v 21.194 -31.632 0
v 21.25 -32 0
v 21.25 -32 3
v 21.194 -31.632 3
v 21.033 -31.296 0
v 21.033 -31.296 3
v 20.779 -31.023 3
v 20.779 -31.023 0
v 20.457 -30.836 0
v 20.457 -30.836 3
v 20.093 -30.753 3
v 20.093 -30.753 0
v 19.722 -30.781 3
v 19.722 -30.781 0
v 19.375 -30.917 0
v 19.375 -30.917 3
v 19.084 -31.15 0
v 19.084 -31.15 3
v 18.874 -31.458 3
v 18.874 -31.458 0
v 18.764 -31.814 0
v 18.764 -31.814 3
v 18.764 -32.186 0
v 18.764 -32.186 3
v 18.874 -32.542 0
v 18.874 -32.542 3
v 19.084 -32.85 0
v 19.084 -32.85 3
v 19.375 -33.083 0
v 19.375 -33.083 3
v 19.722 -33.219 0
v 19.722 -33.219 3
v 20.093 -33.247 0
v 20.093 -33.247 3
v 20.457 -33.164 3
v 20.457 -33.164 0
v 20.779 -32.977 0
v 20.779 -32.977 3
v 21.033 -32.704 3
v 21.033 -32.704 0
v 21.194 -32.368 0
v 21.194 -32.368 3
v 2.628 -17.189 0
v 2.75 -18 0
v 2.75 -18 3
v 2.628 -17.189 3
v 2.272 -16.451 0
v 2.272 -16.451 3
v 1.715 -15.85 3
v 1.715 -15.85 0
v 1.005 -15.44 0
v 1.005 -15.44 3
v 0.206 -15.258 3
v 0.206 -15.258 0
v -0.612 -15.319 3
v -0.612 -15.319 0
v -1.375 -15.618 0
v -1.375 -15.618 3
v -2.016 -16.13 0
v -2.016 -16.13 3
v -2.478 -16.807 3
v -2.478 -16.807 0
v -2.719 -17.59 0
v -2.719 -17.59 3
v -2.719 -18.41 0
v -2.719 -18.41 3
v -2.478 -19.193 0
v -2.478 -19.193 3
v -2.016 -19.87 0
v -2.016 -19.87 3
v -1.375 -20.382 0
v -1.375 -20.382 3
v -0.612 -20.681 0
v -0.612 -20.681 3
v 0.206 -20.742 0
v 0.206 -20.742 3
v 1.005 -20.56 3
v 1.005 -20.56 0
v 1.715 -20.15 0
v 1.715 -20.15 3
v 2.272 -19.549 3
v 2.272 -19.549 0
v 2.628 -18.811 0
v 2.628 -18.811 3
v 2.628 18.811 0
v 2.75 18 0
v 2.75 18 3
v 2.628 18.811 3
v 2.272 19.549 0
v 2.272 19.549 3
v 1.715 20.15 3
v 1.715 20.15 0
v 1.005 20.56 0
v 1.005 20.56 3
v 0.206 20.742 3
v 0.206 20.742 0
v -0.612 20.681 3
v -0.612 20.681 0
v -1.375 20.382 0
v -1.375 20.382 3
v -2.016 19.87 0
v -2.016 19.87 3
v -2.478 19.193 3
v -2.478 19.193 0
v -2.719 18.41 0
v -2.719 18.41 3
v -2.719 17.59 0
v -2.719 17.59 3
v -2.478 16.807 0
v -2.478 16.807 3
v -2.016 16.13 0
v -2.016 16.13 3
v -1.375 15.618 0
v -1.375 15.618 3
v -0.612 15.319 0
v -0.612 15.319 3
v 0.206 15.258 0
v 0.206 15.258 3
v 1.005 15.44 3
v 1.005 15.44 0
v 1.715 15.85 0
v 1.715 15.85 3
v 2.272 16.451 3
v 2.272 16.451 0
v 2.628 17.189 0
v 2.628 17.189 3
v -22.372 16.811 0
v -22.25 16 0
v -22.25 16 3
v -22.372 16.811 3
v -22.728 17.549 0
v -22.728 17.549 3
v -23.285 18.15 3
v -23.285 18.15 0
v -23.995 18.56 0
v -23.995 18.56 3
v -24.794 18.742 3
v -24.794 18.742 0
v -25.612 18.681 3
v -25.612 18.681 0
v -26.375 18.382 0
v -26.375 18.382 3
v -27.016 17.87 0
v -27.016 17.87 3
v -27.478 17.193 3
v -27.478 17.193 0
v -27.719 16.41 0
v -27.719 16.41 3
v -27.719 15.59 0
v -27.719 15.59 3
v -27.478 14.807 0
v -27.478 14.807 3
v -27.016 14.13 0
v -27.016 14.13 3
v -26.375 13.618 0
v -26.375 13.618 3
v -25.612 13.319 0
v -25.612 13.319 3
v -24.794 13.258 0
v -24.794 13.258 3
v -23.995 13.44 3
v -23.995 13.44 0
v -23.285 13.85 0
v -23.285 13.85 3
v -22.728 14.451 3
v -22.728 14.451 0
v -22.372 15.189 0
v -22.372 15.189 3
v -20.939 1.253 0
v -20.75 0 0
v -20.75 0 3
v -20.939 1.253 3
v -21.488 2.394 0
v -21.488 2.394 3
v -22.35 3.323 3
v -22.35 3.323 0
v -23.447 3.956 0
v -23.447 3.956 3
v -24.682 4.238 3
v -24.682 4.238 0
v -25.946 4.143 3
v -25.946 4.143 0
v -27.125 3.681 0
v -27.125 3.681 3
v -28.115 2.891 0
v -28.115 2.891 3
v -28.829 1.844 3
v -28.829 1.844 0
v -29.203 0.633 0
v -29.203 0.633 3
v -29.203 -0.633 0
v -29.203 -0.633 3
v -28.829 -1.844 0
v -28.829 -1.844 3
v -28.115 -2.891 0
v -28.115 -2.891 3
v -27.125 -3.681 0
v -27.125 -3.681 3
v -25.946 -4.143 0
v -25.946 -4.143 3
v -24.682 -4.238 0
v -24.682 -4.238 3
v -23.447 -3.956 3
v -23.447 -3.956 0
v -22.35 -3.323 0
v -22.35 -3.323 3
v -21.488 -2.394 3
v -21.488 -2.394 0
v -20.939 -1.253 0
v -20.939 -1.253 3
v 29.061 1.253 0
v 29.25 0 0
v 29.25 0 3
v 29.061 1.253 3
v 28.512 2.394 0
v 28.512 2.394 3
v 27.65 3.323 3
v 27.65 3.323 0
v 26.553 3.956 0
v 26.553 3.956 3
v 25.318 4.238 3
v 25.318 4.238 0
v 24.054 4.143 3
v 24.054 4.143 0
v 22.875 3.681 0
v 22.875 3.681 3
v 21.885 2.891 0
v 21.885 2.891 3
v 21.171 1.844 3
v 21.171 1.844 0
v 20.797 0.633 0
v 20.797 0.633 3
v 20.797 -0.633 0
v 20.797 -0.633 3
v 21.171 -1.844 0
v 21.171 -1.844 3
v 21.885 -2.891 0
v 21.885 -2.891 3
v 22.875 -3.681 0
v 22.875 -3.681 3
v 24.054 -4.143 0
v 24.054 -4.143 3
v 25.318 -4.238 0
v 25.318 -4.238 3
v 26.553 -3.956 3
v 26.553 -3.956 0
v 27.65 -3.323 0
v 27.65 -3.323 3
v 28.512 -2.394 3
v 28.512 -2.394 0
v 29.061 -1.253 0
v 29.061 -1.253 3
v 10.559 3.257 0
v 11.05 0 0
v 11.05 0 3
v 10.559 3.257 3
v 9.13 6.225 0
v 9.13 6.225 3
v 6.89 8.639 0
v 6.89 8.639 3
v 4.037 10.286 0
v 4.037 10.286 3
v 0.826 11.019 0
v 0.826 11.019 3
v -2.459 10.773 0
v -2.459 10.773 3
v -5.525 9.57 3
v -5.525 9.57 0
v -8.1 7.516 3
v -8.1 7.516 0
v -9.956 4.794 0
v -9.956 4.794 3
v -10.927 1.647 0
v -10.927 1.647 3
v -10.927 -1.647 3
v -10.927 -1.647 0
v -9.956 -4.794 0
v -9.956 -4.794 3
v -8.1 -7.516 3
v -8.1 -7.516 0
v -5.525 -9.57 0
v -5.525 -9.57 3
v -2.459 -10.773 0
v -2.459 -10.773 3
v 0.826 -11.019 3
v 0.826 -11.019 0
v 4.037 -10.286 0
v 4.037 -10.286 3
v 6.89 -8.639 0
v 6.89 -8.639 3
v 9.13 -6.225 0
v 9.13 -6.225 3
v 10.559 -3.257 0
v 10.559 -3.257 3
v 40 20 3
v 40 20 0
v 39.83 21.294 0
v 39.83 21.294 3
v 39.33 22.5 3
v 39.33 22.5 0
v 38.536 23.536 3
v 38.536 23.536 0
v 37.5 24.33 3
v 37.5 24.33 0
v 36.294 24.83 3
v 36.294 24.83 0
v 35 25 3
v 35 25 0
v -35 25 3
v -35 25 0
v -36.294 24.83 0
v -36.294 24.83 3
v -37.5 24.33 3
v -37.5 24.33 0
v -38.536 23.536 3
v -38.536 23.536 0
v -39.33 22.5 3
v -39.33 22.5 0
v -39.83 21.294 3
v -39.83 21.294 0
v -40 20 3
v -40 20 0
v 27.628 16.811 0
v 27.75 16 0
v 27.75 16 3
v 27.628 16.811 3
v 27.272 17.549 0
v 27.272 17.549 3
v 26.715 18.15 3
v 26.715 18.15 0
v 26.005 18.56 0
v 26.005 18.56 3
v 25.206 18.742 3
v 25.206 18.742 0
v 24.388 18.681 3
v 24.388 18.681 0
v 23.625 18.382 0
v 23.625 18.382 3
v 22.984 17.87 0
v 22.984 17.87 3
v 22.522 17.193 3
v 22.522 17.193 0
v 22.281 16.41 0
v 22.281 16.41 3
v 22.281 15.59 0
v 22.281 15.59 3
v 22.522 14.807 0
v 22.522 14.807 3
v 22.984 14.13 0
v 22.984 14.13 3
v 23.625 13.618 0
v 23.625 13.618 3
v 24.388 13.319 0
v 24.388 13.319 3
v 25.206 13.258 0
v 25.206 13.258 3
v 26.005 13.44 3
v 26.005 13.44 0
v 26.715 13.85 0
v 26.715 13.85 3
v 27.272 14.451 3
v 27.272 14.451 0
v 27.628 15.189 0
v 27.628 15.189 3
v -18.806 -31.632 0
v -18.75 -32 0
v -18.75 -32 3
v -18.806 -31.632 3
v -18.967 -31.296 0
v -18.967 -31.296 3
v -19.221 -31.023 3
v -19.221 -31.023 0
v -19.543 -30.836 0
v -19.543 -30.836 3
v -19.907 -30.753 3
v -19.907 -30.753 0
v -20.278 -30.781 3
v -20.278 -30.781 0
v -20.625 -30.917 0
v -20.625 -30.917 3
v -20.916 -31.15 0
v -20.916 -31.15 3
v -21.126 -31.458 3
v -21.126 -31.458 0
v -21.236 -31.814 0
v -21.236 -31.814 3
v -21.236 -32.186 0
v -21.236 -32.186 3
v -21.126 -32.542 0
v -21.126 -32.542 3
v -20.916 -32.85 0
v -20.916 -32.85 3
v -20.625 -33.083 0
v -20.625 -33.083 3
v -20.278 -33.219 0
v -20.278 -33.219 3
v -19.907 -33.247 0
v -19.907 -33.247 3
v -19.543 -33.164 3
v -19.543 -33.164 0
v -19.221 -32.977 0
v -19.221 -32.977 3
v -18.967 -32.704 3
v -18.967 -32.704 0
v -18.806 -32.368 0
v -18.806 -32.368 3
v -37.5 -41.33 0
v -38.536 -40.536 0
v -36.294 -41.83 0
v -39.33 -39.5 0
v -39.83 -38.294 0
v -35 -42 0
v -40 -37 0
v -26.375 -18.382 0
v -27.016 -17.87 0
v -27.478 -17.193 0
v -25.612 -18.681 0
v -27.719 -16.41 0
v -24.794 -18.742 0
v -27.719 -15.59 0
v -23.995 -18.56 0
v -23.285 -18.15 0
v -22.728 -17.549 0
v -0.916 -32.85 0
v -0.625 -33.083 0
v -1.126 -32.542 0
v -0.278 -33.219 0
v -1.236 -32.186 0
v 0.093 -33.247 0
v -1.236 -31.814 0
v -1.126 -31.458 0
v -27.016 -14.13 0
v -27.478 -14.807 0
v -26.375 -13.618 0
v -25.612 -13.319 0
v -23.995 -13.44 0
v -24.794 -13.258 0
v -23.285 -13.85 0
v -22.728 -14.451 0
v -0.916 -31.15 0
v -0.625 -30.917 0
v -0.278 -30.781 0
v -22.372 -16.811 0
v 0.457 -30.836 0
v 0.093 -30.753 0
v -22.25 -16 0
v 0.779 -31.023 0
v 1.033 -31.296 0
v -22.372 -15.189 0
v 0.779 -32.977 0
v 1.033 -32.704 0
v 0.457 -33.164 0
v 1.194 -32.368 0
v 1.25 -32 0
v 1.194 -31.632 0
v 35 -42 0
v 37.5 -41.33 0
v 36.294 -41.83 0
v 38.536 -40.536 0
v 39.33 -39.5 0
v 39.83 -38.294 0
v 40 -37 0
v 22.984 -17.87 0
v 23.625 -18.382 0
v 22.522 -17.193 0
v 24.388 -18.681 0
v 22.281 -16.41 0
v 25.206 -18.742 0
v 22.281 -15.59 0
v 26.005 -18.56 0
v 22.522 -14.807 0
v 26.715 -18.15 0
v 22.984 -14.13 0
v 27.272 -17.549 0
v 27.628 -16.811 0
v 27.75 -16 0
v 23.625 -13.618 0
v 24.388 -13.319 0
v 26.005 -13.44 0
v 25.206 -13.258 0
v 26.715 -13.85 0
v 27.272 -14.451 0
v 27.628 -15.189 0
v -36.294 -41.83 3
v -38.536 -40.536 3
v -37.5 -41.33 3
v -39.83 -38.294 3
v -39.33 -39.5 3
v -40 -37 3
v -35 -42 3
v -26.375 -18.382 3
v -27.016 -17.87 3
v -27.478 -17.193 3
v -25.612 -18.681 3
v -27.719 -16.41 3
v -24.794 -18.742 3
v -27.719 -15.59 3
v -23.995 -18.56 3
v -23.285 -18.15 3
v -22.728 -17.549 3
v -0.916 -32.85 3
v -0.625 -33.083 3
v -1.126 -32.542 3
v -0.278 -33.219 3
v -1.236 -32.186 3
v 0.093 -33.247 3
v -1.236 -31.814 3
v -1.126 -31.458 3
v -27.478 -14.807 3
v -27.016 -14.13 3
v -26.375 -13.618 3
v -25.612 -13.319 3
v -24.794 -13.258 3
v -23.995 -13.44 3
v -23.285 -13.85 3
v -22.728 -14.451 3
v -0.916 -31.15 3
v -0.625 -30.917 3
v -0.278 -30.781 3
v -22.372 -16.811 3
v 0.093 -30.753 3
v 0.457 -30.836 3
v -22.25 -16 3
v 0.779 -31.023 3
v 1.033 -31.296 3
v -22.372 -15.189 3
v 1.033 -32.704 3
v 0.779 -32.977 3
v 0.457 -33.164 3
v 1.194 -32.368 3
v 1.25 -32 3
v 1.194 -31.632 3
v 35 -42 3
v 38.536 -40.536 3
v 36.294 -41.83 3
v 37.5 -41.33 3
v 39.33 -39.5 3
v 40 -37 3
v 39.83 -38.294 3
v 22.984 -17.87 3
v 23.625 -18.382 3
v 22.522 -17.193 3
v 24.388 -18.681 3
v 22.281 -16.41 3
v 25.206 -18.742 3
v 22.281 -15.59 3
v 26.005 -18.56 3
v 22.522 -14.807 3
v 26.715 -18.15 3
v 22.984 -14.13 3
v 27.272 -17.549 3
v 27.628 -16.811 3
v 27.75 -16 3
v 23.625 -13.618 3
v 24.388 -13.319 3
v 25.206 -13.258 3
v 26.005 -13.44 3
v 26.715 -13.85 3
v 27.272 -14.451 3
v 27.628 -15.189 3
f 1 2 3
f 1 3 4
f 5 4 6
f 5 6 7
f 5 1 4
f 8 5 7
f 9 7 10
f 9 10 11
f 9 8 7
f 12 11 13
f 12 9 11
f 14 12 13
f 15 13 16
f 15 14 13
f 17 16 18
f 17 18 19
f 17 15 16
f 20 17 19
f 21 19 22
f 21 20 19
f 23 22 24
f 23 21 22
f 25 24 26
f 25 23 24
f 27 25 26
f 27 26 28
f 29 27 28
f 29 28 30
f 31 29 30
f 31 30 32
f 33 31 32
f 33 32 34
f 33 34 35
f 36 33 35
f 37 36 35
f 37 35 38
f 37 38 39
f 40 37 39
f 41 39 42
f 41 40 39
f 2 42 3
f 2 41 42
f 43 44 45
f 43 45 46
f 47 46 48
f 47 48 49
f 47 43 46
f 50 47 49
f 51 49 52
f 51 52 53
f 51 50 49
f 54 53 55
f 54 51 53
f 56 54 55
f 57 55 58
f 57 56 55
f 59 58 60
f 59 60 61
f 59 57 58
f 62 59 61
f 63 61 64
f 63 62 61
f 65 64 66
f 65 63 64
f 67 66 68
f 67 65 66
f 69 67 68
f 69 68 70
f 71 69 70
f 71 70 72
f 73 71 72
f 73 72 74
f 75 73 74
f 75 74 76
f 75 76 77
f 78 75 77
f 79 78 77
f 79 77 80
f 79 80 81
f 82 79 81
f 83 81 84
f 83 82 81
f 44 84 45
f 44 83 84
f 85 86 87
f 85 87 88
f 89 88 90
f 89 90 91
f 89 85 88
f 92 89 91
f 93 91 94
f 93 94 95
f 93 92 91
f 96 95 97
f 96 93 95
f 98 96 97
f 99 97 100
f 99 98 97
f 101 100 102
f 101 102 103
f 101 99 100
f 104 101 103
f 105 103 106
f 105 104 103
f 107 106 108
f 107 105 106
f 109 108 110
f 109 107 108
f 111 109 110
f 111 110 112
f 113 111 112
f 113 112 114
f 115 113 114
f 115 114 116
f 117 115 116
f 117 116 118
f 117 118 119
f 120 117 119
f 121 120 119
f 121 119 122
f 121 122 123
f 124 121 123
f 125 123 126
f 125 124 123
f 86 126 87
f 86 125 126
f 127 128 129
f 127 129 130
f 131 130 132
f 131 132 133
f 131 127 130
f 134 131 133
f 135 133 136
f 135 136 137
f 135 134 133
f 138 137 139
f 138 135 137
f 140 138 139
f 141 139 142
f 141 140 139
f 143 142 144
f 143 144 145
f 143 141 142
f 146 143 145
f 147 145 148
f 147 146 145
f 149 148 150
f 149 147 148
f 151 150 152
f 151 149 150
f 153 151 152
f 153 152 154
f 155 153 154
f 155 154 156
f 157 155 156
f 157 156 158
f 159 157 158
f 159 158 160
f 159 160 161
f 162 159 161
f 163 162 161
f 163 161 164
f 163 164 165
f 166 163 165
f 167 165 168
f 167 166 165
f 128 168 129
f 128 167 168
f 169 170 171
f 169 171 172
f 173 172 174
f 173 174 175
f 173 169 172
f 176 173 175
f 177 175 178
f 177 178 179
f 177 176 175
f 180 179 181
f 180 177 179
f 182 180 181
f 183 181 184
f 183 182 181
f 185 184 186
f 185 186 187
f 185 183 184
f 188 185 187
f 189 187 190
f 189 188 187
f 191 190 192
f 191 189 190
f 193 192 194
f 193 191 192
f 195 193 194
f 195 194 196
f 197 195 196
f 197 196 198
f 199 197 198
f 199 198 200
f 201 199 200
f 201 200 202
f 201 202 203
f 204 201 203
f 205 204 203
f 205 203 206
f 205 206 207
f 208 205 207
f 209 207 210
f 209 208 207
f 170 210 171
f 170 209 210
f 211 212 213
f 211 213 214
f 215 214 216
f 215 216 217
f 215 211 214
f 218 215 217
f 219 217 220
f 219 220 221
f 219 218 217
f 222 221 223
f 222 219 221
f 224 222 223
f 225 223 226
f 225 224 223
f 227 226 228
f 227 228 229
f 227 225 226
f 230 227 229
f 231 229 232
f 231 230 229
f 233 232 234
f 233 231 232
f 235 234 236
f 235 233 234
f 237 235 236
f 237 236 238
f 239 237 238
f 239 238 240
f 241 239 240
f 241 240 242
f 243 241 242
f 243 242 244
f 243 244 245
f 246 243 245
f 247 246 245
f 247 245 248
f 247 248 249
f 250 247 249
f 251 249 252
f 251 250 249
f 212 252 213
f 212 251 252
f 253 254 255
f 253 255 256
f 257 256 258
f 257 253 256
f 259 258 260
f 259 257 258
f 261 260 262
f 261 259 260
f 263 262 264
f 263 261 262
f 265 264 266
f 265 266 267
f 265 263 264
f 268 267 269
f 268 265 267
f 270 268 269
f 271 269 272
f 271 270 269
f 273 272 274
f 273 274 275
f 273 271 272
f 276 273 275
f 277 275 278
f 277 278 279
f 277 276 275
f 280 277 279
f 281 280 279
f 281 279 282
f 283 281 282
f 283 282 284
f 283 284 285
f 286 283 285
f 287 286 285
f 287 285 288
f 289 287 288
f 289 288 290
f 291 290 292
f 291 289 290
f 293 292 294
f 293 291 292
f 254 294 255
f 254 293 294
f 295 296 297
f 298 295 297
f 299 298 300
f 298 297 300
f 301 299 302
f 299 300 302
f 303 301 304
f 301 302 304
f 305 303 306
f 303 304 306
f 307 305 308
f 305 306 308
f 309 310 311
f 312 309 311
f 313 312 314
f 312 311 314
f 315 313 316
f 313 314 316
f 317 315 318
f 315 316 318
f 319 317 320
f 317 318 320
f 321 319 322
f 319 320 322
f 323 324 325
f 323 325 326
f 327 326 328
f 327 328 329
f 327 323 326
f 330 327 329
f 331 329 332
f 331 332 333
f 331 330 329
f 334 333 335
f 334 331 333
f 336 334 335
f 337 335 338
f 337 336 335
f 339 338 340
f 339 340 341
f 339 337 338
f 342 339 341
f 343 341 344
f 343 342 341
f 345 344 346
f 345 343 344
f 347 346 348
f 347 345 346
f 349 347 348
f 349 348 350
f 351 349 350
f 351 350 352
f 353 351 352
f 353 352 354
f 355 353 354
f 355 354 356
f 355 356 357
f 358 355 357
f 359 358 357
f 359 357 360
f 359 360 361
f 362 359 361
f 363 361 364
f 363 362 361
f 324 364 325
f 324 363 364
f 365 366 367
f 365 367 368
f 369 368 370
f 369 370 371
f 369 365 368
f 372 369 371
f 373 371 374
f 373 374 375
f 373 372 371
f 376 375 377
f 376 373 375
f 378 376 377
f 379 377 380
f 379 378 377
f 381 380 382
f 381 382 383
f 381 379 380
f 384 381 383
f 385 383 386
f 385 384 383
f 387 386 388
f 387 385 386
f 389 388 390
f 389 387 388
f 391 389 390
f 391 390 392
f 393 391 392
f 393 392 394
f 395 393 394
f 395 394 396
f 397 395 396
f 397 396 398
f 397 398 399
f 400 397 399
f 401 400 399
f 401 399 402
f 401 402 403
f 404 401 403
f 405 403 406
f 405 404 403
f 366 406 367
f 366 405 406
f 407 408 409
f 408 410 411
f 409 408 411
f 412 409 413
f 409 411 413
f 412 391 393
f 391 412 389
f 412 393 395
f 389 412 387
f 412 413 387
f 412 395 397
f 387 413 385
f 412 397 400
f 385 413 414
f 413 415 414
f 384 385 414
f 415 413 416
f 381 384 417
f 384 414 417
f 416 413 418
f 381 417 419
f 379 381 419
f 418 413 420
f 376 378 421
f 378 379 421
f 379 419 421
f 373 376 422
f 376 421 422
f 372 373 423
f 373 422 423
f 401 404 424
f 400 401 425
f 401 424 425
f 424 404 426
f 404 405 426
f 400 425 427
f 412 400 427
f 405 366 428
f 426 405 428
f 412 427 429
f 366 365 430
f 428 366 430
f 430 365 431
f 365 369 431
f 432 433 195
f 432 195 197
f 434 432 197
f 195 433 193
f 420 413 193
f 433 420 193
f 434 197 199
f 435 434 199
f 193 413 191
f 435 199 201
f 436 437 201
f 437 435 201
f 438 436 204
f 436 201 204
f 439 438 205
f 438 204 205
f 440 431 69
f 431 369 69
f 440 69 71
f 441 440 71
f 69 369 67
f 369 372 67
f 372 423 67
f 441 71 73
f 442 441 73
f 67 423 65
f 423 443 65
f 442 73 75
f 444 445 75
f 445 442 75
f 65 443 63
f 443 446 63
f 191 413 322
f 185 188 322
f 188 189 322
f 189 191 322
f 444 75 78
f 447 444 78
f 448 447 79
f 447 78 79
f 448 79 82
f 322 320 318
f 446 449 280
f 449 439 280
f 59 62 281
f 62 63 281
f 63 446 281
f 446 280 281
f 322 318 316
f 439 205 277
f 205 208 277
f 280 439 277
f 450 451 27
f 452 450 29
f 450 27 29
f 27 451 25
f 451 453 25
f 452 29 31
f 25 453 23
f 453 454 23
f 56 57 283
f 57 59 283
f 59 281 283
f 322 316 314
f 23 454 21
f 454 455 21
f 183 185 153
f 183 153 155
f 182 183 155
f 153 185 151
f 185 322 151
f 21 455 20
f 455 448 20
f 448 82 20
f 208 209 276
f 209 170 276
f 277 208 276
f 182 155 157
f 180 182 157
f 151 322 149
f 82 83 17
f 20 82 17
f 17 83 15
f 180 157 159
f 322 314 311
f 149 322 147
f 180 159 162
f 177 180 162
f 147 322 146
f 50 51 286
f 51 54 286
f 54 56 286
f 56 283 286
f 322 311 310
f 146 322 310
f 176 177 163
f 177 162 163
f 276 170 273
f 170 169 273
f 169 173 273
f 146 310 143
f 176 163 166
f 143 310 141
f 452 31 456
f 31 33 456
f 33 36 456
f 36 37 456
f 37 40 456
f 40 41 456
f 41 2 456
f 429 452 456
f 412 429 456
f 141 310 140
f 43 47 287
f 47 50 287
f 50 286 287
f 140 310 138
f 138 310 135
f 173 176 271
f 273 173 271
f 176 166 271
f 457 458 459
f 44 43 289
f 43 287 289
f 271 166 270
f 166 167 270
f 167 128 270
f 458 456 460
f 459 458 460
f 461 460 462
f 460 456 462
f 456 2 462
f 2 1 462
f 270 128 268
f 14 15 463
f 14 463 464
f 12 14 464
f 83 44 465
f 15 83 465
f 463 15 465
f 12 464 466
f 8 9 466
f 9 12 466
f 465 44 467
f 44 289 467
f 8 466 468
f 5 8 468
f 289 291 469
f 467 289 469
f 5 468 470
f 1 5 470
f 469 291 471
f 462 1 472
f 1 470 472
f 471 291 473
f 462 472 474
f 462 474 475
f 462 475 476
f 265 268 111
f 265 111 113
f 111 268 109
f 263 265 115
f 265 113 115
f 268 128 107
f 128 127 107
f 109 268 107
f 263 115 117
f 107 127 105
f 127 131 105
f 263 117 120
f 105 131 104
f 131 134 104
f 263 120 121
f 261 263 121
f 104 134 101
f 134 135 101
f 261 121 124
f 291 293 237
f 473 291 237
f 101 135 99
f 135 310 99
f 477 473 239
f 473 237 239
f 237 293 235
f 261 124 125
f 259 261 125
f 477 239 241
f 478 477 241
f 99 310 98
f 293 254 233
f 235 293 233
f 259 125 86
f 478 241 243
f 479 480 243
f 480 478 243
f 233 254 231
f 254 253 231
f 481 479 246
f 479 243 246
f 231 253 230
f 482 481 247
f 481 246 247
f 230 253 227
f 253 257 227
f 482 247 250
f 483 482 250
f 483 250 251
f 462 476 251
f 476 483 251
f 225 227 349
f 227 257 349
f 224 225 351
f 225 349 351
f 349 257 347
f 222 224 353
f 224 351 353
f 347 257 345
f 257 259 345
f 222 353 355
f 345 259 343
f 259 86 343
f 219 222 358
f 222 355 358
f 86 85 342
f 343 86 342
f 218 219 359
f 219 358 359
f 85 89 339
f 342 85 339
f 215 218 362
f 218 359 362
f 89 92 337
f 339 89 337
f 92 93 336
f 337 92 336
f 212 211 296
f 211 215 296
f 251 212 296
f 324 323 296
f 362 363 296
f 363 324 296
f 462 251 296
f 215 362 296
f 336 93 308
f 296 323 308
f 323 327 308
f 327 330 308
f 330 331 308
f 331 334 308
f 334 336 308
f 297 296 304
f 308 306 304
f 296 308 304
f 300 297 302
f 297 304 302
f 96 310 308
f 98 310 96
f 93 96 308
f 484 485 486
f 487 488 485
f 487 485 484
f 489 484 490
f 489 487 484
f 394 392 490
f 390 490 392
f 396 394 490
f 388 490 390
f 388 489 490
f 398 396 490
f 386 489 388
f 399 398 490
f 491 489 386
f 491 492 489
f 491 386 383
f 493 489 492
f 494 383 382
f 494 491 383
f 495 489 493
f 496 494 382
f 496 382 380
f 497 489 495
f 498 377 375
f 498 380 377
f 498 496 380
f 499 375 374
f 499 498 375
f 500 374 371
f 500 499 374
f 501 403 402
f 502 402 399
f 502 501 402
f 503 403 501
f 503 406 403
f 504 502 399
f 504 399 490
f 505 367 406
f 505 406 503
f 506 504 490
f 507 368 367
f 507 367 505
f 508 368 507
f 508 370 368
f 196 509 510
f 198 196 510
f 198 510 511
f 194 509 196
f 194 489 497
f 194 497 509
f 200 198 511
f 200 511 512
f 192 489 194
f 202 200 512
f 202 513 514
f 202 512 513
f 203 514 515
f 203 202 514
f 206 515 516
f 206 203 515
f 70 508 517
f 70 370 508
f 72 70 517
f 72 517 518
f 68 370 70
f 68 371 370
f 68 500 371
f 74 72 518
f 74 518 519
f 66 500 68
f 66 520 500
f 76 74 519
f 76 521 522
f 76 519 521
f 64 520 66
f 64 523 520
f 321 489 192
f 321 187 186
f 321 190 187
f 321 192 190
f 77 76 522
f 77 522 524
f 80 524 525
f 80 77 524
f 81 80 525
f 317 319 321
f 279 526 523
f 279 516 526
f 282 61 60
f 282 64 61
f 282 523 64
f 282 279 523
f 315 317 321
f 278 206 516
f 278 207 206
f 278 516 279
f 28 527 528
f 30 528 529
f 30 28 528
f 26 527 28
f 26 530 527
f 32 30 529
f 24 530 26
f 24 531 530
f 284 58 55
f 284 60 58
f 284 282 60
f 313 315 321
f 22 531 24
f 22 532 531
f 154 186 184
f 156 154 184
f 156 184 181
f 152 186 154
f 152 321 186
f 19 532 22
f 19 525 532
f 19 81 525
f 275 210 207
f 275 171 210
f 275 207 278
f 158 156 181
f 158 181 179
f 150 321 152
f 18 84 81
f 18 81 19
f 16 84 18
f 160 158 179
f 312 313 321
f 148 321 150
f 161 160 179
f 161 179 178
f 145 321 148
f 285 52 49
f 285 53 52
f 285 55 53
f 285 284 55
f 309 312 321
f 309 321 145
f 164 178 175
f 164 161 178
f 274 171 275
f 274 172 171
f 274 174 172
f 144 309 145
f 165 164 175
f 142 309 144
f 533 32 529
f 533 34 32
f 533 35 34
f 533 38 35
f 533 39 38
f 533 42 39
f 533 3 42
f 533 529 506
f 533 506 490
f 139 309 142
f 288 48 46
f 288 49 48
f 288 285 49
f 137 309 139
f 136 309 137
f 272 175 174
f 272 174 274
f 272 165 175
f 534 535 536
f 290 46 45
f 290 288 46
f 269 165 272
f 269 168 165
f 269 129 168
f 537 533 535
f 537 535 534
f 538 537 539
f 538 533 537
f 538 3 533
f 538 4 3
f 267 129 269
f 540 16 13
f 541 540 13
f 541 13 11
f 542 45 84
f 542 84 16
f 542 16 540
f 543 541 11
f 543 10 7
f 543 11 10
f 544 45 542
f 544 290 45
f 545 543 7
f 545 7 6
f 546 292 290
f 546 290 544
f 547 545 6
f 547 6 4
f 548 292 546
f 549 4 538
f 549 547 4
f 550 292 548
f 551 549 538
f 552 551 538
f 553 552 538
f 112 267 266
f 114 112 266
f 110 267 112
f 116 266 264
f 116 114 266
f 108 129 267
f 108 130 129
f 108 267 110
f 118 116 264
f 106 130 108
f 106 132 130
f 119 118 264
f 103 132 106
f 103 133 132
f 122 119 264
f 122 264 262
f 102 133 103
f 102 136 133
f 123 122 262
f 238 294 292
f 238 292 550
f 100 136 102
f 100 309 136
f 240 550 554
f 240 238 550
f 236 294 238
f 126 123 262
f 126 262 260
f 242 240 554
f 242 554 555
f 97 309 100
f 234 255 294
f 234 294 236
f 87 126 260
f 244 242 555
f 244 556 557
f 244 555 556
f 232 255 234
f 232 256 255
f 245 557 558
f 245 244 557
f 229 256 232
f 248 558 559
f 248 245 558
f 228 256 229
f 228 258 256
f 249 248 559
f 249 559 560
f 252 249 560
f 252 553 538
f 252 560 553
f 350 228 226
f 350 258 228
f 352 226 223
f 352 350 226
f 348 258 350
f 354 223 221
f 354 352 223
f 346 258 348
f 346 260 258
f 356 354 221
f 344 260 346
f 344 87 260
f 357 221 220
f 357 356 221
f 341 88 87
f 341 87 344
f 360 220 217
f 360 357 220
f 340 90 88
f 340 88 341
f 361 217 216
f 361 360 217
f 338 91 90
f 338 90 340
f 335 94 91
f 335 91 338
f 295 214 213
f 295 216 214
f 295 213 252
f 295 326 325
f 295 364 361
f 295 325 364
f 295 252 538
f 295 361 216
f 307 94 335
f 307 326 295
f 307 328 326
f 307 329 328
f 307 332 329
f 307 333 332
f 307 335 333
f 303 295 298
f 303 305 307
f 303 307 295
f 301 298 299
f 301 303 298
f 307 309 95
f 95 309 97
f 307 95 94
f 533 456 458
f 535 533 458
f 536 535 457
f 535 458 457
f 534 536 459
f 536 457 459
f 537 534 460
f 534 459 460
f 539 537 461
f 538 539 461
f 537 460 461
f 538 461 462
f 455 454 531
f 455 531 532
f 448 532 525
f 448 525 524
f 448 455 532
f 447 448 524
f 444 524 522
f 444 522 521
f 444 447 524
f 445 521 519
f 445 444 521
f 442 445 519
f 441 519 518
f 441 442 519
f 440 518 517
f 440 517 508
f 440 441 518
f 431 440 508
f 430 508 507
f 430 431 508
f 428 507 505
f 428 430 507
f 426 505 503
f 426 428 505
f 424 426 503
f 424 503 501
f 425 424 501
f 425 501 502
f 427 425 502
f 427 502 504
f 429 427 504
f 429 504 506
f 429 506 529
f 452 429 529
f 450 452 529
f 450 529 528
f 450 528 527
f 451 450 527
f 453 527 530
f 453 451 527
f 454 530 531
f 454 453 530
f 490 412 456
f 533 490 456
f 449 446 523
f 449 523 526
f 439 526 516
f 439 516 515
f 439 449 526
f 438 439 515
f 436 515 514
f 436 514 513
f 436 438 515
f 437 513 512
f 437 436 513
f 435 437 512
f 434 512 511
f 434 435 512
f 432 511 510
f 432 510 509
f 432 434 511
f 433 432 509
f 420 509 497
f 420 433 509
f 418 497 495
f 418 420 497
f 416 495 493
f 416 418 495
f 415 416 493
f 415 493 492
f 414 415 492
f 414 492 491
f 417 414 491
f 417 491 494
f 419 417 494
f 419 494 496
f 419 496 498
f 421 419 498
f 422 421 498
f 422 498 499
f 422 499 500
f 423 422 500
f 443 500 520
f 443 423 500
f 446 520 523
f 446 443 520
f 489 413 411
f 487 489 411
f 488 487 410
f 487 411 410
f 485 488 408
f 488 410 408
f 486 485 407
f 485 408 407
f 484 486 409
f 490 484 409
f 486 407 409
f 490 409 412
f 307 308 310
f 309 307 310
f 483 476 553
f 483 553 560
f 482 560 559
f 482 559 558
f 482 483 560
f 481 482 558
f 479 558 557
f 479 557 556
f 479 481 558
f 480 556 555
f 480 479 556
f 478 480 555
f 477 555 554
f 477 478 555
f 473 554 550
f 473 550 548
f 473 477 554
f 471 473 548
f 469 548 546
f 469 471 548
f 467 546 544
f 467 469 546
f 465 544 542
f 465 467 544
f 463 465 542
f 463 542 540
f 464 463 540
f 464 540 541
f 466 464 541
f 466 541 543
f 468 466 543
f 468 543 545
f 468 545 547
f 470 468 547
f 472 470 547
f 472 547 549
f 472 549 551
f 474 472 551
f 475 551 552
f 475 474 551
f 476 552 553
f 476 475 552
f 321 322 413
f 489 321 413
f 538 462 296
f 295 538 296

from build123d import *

# Parameters (mm, degrees)
SKETCH_1_R      = 11.05
SKETCH_1_R_2    = 2.75
SKETCH_1_R_3    = 1.25
SKETCH_1_R_4    = 4.25
EXTRUDE_1_DEPTH = 3


with BuildPart() as part:
    # 草图1 → 凸台-拉伸1 (new body)
    with BuildSketch(Plane.XY):
        with BuildLine():
            Line((-40, 20), (-40, -37))
            ThreePointArc((-40, -37), (-38.535533906, -40.535533906), (-35, -42))
            Line((-35, -42), (35, -42))
            ThreePointArc((35, -42), (38.535533906, -40.535533906), (40, -37))
            Line((40, -37), (40, 20))
            ThreePointArc((40, 20), (38.535533906, 23.535533906), (35, 25))
            Line((35, 25), (-35, 25))
            ThreePointArc((-35, 25), (-38.535533906, 23.535533906), (-40, 20))
        make_face()
        Circle(SKETCH_1_R, mode=Mode.SUBTRACT)
        with Locations((-25, 16)):
            Circle(SKETCH_1_R_2, mode=Mode.SUBTRACT)
        with Locations((-25, -16)):
            Circle(SKETCH_1_R_2, mode=Mode.SUBTRACT)
        with Locations((25, -16)):
            Circle(SKETCH_1_R_2, mode=Mode.SUBTRACT)
        with Locations((25, 16)):
            Circle(SKETCH_1_R_2, mode=Mode.SUBTRACT)
        with Locations((0, -32)):
            Circle(SKETCH_1_R_3, mode=Mode.SUBTRACT)
        with Locations((-20, -32)):
            Circle(SKETCH_1_R_3, mode=Mode.SUBTRACT)
        with Locations((20, -32)):
            Circle(SKETCH_1_R_3, mode=Mode.SUBTRACT)
        with Locations((-25, 0)):
            Circle(SKETCH_1_R_4, mode=Mode.SUBTRACT)
        with Locations((25, 0)):
            Circle(SKETCH_1_R_4, mode=Mode.SUBTRACT)
        with Locations((0, 18)):
            Circle(SKETCH_1_R_2, mode=Mode.SUBTRACT)
        with Locations((0, -18)):
            Circle(SKETCH_1_R_2, mode=Mode.SUBTRACT)
    extrude(amount=EXTRUDE_1_DEPTH)


solid = part.part
